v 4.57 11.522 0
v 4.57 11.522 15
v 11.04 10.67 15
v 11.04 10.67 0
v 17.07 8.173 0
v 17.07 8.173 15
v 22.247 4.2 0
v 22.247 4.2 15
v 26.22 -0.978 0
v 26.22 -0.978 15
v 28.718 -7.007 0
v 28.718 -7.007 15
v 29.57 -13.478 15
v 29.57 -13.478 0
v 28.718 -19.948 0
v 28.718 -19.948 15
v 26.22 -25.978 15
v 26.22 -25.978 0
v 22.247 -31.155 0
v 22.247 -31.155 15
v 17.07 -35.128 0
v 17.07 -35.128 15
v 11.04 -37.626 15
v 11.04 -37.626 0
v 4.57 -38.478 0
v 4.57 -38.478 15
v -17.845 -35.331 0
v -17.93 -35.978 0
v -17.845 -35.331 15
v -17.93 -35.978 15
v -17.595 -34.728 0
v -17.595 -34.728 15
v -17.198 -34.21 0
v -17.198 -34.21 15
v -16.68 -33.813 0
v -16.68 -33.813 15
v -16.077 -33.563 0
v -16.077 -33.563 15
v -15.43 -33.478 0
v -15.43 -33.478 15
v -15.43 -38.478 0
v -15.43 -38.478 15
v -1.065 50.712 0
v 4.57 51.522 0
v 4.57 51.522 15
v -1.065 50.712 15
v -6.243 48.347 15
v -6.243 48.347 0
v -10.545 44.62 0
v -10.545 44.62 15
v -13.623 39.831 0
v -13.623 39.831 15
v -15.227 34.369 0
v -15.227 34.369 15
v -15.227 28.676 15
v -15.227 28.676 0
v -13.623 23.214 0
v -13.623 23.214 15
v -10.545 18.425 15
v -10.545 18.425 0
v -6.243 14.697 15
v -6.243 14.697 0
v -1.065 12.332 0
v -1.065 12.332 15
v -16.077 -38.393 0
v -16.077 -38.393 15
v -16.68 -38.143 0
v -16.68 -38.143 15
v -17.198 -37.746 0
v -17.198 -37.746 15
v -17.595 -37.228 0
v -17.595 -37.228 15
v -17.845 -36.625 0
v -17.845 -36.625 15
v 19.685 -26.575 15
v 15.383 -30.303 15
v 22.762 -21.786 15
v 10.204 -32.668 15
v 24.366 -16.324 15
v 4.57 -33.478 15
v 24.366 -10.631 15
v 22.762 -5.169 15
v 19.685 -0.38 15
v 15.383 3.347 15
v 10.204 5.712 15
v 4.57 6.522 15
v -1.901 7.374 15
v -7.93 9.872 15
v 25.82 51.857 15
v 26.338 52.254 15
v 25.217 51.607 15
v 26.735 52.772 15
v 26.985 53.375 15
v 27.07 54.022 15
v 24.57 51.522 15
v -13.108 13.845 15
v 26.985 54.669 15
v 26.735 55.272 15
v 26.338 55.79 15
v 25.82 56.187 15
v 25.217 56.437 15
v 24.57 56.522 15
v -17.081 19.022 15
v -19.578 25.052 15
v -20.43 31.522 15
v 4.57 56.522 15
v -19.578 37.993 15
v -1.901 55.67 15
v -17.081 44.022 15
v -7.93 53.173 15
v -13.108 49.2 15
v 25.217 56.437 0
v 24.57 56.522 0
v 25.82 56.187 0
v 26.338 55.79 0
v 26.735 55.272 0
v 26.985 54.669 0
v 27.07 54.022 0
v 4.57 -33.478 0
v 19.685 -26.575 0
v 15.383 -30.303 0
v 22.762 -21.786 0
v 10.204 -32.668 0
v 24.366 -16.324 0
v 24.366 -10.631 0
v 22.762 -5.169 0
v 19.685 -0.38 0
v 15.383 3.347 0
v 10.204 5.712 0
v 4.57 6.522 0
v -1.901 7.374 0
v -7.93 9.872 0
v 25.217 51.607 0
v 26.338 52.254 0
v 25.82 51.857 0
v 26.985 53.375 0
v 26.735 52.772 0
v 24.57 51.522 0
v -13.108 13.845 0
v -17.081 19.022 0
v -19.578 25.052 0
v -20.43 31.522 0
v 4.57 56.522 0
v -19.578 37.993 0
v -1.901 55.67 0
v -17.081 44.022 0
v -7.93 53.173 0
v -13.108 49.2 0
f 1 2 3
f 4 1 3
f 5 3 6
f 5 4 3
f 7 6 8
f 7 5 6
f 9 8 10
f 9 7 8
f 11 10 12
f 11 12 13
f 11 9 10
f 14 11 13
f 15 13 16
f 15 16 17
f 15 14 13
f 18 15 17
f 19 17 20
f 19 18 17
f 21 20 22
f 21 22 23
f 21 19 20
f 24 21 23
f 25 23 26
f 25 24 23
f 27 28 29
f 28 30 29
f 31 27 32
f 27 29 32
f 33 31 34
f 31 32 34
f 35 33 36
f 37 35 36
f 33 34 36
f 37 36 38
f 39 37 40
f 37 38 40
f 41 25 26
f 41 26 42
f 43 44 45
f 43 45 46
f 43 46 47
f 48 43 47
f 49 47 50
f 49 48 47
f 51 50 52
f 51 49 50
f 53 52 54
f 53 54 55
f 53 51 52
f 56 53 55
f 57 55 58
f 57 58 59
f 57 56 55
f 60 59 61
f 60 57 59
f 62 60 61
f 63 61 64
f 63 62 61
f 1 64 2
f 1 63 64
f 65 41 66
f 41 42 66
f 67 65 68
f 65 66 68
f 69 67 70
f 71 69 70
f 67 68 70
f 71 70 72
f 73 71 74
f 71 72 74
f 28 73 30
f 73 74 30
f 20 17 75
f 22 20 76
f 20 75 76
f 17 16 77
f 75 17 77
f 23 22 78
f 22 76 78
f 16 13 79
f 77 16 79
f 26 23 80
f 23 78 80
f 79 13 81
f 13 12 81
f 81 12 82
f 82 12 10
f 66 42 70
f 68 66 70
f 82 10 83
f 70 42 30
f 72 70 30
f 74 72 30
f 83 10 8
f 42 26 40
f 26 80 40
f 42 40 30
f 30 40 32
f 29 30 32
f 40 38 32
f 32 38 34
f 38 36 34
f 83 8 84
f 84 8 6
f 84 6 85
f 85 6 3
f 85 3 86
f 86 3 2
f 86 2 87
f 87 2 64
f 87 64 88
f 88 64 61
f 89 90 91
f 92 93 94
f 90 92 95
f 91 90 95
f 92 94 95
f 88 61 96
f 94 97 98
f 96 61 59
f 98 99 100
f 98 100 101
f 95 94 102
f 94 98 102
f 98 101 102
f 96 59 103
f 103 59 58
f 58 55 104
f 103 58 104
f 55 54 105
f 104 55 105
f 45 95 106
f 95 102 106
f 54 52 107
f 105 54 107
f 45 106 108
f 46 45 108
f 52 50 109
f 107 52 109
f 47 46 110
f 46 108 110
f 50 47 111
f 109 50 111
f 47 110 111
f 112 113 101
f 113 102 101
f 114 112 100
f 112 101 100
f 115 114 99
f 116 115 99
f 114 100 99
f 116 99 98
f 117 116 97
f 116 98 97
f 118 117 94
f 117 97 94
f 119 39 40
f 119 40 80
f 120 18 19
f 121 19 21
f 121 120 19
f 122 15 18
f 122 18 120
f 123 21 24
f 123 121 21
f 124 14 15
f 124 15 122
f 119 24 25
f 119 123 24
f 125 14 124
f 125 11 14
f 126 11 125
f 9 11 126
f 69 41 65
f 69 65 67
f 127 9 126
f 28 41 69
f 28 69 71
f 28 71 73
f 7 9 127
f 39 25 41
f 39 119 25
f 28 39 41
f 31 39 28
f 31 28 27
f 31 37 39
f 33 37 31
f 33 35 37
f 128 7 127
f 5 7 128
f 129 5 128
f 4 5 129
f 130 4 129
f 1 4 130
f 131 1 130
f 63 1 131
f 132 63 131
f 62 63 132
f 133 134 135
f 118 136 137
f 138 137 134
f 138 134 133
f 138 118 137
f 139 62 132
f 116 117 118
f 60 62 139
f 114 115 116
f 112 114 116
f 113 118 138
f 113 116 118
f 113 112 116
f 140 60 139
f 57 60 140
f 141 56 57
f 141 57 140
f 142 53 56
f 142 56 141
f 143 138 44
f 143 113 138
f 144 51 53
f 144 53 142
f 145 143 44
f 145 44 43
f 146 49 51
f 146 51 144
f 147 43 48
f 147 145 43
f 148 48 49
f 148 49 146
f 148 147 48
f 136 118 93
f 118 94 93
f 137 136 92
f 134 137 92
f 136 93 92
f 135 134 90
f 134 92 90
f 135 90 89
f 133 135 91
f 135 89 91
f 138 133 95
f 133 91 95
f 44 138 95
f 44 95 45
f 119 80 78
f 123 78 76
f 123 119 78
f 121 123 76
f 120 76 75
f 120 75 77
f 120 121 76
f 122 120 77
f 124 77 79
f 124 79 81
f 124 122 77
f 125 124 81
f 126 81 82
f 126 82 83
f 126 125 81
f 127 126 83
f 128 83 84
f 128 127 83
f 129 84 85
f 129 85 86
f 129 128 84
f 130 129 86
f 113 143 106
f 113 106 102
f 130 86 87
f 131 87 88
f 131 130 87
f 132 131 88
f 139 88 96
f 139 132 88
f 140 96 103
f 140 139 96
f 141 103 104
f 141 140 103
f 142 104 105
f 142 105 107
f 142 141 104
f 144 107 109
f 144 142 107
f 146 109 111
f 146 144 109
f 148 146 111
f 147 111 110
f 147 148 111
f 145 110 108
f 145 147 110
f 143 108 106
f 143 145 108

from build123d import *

# Parameters (mm, degrees)
BOSS_EXTRUDE1_DEPTH = 15
FILLET1_R           = 2.5


with BuildPart() as part:
    # Sketch1 → Boss-Extrude1 (new body)
    with BuildSketch(Plane.XY):
        with BuildLine():
            Line((4.569752453, 56.5222889), (27.069752453, 56.5222889))
            Line((27.069752453, 56.5222889), (27.069752453, 51.5222889))
            Line((27.069752453, 51.5222889), (4.569751288, 51.5222889))
            ThreePointArc((4.569751288, 51.5222889), (-15.430247547, 31.522287735), (4.569753619, 11.5222889))
            ThreePointArc((4.569753619, 11.5222889), (29.569753619, -13.4777111), (4.569753619, -38.4777111))
            Line((4.569753619, -38.4777111), (-17.930246381, -38.4777111))
            Line((-17.930246381, -38.4777111), (-17.930246381, -33.4777111))
            Line((-17.930246381, -33.4777111), (4.569753619, -33.4777111))
            ThreePointArc((4.569753619, -33.4777111), (24.569753619, -13.477710841), (4.569753101, 6.5222889))
            ThreePointArc((4.569753101, 6.5222889), (-20.430247547, 31.522288577), (4.569752453, 56.5222889))
        make_face()
    extrude(amount=BOSS_EXTRUDE1_DEPTH)

    # Fillet1
    fillet1_edges = [part.edges().sort_by_distance(p)[0] for p in [
        (-17.930246381, -38.4777111, 7.5),
        (-17.930246381, -33.4777111, 7.5),
        (27.069752453, 51.5222889, 7.5),
        (27.069752453, 56.5222889, 7.5),
    ]]
    fillet(fillet1_edges, radius=FILLET1_R - 0.0001)  # a hair under: the kernel refuses the full size


solid = part.part
